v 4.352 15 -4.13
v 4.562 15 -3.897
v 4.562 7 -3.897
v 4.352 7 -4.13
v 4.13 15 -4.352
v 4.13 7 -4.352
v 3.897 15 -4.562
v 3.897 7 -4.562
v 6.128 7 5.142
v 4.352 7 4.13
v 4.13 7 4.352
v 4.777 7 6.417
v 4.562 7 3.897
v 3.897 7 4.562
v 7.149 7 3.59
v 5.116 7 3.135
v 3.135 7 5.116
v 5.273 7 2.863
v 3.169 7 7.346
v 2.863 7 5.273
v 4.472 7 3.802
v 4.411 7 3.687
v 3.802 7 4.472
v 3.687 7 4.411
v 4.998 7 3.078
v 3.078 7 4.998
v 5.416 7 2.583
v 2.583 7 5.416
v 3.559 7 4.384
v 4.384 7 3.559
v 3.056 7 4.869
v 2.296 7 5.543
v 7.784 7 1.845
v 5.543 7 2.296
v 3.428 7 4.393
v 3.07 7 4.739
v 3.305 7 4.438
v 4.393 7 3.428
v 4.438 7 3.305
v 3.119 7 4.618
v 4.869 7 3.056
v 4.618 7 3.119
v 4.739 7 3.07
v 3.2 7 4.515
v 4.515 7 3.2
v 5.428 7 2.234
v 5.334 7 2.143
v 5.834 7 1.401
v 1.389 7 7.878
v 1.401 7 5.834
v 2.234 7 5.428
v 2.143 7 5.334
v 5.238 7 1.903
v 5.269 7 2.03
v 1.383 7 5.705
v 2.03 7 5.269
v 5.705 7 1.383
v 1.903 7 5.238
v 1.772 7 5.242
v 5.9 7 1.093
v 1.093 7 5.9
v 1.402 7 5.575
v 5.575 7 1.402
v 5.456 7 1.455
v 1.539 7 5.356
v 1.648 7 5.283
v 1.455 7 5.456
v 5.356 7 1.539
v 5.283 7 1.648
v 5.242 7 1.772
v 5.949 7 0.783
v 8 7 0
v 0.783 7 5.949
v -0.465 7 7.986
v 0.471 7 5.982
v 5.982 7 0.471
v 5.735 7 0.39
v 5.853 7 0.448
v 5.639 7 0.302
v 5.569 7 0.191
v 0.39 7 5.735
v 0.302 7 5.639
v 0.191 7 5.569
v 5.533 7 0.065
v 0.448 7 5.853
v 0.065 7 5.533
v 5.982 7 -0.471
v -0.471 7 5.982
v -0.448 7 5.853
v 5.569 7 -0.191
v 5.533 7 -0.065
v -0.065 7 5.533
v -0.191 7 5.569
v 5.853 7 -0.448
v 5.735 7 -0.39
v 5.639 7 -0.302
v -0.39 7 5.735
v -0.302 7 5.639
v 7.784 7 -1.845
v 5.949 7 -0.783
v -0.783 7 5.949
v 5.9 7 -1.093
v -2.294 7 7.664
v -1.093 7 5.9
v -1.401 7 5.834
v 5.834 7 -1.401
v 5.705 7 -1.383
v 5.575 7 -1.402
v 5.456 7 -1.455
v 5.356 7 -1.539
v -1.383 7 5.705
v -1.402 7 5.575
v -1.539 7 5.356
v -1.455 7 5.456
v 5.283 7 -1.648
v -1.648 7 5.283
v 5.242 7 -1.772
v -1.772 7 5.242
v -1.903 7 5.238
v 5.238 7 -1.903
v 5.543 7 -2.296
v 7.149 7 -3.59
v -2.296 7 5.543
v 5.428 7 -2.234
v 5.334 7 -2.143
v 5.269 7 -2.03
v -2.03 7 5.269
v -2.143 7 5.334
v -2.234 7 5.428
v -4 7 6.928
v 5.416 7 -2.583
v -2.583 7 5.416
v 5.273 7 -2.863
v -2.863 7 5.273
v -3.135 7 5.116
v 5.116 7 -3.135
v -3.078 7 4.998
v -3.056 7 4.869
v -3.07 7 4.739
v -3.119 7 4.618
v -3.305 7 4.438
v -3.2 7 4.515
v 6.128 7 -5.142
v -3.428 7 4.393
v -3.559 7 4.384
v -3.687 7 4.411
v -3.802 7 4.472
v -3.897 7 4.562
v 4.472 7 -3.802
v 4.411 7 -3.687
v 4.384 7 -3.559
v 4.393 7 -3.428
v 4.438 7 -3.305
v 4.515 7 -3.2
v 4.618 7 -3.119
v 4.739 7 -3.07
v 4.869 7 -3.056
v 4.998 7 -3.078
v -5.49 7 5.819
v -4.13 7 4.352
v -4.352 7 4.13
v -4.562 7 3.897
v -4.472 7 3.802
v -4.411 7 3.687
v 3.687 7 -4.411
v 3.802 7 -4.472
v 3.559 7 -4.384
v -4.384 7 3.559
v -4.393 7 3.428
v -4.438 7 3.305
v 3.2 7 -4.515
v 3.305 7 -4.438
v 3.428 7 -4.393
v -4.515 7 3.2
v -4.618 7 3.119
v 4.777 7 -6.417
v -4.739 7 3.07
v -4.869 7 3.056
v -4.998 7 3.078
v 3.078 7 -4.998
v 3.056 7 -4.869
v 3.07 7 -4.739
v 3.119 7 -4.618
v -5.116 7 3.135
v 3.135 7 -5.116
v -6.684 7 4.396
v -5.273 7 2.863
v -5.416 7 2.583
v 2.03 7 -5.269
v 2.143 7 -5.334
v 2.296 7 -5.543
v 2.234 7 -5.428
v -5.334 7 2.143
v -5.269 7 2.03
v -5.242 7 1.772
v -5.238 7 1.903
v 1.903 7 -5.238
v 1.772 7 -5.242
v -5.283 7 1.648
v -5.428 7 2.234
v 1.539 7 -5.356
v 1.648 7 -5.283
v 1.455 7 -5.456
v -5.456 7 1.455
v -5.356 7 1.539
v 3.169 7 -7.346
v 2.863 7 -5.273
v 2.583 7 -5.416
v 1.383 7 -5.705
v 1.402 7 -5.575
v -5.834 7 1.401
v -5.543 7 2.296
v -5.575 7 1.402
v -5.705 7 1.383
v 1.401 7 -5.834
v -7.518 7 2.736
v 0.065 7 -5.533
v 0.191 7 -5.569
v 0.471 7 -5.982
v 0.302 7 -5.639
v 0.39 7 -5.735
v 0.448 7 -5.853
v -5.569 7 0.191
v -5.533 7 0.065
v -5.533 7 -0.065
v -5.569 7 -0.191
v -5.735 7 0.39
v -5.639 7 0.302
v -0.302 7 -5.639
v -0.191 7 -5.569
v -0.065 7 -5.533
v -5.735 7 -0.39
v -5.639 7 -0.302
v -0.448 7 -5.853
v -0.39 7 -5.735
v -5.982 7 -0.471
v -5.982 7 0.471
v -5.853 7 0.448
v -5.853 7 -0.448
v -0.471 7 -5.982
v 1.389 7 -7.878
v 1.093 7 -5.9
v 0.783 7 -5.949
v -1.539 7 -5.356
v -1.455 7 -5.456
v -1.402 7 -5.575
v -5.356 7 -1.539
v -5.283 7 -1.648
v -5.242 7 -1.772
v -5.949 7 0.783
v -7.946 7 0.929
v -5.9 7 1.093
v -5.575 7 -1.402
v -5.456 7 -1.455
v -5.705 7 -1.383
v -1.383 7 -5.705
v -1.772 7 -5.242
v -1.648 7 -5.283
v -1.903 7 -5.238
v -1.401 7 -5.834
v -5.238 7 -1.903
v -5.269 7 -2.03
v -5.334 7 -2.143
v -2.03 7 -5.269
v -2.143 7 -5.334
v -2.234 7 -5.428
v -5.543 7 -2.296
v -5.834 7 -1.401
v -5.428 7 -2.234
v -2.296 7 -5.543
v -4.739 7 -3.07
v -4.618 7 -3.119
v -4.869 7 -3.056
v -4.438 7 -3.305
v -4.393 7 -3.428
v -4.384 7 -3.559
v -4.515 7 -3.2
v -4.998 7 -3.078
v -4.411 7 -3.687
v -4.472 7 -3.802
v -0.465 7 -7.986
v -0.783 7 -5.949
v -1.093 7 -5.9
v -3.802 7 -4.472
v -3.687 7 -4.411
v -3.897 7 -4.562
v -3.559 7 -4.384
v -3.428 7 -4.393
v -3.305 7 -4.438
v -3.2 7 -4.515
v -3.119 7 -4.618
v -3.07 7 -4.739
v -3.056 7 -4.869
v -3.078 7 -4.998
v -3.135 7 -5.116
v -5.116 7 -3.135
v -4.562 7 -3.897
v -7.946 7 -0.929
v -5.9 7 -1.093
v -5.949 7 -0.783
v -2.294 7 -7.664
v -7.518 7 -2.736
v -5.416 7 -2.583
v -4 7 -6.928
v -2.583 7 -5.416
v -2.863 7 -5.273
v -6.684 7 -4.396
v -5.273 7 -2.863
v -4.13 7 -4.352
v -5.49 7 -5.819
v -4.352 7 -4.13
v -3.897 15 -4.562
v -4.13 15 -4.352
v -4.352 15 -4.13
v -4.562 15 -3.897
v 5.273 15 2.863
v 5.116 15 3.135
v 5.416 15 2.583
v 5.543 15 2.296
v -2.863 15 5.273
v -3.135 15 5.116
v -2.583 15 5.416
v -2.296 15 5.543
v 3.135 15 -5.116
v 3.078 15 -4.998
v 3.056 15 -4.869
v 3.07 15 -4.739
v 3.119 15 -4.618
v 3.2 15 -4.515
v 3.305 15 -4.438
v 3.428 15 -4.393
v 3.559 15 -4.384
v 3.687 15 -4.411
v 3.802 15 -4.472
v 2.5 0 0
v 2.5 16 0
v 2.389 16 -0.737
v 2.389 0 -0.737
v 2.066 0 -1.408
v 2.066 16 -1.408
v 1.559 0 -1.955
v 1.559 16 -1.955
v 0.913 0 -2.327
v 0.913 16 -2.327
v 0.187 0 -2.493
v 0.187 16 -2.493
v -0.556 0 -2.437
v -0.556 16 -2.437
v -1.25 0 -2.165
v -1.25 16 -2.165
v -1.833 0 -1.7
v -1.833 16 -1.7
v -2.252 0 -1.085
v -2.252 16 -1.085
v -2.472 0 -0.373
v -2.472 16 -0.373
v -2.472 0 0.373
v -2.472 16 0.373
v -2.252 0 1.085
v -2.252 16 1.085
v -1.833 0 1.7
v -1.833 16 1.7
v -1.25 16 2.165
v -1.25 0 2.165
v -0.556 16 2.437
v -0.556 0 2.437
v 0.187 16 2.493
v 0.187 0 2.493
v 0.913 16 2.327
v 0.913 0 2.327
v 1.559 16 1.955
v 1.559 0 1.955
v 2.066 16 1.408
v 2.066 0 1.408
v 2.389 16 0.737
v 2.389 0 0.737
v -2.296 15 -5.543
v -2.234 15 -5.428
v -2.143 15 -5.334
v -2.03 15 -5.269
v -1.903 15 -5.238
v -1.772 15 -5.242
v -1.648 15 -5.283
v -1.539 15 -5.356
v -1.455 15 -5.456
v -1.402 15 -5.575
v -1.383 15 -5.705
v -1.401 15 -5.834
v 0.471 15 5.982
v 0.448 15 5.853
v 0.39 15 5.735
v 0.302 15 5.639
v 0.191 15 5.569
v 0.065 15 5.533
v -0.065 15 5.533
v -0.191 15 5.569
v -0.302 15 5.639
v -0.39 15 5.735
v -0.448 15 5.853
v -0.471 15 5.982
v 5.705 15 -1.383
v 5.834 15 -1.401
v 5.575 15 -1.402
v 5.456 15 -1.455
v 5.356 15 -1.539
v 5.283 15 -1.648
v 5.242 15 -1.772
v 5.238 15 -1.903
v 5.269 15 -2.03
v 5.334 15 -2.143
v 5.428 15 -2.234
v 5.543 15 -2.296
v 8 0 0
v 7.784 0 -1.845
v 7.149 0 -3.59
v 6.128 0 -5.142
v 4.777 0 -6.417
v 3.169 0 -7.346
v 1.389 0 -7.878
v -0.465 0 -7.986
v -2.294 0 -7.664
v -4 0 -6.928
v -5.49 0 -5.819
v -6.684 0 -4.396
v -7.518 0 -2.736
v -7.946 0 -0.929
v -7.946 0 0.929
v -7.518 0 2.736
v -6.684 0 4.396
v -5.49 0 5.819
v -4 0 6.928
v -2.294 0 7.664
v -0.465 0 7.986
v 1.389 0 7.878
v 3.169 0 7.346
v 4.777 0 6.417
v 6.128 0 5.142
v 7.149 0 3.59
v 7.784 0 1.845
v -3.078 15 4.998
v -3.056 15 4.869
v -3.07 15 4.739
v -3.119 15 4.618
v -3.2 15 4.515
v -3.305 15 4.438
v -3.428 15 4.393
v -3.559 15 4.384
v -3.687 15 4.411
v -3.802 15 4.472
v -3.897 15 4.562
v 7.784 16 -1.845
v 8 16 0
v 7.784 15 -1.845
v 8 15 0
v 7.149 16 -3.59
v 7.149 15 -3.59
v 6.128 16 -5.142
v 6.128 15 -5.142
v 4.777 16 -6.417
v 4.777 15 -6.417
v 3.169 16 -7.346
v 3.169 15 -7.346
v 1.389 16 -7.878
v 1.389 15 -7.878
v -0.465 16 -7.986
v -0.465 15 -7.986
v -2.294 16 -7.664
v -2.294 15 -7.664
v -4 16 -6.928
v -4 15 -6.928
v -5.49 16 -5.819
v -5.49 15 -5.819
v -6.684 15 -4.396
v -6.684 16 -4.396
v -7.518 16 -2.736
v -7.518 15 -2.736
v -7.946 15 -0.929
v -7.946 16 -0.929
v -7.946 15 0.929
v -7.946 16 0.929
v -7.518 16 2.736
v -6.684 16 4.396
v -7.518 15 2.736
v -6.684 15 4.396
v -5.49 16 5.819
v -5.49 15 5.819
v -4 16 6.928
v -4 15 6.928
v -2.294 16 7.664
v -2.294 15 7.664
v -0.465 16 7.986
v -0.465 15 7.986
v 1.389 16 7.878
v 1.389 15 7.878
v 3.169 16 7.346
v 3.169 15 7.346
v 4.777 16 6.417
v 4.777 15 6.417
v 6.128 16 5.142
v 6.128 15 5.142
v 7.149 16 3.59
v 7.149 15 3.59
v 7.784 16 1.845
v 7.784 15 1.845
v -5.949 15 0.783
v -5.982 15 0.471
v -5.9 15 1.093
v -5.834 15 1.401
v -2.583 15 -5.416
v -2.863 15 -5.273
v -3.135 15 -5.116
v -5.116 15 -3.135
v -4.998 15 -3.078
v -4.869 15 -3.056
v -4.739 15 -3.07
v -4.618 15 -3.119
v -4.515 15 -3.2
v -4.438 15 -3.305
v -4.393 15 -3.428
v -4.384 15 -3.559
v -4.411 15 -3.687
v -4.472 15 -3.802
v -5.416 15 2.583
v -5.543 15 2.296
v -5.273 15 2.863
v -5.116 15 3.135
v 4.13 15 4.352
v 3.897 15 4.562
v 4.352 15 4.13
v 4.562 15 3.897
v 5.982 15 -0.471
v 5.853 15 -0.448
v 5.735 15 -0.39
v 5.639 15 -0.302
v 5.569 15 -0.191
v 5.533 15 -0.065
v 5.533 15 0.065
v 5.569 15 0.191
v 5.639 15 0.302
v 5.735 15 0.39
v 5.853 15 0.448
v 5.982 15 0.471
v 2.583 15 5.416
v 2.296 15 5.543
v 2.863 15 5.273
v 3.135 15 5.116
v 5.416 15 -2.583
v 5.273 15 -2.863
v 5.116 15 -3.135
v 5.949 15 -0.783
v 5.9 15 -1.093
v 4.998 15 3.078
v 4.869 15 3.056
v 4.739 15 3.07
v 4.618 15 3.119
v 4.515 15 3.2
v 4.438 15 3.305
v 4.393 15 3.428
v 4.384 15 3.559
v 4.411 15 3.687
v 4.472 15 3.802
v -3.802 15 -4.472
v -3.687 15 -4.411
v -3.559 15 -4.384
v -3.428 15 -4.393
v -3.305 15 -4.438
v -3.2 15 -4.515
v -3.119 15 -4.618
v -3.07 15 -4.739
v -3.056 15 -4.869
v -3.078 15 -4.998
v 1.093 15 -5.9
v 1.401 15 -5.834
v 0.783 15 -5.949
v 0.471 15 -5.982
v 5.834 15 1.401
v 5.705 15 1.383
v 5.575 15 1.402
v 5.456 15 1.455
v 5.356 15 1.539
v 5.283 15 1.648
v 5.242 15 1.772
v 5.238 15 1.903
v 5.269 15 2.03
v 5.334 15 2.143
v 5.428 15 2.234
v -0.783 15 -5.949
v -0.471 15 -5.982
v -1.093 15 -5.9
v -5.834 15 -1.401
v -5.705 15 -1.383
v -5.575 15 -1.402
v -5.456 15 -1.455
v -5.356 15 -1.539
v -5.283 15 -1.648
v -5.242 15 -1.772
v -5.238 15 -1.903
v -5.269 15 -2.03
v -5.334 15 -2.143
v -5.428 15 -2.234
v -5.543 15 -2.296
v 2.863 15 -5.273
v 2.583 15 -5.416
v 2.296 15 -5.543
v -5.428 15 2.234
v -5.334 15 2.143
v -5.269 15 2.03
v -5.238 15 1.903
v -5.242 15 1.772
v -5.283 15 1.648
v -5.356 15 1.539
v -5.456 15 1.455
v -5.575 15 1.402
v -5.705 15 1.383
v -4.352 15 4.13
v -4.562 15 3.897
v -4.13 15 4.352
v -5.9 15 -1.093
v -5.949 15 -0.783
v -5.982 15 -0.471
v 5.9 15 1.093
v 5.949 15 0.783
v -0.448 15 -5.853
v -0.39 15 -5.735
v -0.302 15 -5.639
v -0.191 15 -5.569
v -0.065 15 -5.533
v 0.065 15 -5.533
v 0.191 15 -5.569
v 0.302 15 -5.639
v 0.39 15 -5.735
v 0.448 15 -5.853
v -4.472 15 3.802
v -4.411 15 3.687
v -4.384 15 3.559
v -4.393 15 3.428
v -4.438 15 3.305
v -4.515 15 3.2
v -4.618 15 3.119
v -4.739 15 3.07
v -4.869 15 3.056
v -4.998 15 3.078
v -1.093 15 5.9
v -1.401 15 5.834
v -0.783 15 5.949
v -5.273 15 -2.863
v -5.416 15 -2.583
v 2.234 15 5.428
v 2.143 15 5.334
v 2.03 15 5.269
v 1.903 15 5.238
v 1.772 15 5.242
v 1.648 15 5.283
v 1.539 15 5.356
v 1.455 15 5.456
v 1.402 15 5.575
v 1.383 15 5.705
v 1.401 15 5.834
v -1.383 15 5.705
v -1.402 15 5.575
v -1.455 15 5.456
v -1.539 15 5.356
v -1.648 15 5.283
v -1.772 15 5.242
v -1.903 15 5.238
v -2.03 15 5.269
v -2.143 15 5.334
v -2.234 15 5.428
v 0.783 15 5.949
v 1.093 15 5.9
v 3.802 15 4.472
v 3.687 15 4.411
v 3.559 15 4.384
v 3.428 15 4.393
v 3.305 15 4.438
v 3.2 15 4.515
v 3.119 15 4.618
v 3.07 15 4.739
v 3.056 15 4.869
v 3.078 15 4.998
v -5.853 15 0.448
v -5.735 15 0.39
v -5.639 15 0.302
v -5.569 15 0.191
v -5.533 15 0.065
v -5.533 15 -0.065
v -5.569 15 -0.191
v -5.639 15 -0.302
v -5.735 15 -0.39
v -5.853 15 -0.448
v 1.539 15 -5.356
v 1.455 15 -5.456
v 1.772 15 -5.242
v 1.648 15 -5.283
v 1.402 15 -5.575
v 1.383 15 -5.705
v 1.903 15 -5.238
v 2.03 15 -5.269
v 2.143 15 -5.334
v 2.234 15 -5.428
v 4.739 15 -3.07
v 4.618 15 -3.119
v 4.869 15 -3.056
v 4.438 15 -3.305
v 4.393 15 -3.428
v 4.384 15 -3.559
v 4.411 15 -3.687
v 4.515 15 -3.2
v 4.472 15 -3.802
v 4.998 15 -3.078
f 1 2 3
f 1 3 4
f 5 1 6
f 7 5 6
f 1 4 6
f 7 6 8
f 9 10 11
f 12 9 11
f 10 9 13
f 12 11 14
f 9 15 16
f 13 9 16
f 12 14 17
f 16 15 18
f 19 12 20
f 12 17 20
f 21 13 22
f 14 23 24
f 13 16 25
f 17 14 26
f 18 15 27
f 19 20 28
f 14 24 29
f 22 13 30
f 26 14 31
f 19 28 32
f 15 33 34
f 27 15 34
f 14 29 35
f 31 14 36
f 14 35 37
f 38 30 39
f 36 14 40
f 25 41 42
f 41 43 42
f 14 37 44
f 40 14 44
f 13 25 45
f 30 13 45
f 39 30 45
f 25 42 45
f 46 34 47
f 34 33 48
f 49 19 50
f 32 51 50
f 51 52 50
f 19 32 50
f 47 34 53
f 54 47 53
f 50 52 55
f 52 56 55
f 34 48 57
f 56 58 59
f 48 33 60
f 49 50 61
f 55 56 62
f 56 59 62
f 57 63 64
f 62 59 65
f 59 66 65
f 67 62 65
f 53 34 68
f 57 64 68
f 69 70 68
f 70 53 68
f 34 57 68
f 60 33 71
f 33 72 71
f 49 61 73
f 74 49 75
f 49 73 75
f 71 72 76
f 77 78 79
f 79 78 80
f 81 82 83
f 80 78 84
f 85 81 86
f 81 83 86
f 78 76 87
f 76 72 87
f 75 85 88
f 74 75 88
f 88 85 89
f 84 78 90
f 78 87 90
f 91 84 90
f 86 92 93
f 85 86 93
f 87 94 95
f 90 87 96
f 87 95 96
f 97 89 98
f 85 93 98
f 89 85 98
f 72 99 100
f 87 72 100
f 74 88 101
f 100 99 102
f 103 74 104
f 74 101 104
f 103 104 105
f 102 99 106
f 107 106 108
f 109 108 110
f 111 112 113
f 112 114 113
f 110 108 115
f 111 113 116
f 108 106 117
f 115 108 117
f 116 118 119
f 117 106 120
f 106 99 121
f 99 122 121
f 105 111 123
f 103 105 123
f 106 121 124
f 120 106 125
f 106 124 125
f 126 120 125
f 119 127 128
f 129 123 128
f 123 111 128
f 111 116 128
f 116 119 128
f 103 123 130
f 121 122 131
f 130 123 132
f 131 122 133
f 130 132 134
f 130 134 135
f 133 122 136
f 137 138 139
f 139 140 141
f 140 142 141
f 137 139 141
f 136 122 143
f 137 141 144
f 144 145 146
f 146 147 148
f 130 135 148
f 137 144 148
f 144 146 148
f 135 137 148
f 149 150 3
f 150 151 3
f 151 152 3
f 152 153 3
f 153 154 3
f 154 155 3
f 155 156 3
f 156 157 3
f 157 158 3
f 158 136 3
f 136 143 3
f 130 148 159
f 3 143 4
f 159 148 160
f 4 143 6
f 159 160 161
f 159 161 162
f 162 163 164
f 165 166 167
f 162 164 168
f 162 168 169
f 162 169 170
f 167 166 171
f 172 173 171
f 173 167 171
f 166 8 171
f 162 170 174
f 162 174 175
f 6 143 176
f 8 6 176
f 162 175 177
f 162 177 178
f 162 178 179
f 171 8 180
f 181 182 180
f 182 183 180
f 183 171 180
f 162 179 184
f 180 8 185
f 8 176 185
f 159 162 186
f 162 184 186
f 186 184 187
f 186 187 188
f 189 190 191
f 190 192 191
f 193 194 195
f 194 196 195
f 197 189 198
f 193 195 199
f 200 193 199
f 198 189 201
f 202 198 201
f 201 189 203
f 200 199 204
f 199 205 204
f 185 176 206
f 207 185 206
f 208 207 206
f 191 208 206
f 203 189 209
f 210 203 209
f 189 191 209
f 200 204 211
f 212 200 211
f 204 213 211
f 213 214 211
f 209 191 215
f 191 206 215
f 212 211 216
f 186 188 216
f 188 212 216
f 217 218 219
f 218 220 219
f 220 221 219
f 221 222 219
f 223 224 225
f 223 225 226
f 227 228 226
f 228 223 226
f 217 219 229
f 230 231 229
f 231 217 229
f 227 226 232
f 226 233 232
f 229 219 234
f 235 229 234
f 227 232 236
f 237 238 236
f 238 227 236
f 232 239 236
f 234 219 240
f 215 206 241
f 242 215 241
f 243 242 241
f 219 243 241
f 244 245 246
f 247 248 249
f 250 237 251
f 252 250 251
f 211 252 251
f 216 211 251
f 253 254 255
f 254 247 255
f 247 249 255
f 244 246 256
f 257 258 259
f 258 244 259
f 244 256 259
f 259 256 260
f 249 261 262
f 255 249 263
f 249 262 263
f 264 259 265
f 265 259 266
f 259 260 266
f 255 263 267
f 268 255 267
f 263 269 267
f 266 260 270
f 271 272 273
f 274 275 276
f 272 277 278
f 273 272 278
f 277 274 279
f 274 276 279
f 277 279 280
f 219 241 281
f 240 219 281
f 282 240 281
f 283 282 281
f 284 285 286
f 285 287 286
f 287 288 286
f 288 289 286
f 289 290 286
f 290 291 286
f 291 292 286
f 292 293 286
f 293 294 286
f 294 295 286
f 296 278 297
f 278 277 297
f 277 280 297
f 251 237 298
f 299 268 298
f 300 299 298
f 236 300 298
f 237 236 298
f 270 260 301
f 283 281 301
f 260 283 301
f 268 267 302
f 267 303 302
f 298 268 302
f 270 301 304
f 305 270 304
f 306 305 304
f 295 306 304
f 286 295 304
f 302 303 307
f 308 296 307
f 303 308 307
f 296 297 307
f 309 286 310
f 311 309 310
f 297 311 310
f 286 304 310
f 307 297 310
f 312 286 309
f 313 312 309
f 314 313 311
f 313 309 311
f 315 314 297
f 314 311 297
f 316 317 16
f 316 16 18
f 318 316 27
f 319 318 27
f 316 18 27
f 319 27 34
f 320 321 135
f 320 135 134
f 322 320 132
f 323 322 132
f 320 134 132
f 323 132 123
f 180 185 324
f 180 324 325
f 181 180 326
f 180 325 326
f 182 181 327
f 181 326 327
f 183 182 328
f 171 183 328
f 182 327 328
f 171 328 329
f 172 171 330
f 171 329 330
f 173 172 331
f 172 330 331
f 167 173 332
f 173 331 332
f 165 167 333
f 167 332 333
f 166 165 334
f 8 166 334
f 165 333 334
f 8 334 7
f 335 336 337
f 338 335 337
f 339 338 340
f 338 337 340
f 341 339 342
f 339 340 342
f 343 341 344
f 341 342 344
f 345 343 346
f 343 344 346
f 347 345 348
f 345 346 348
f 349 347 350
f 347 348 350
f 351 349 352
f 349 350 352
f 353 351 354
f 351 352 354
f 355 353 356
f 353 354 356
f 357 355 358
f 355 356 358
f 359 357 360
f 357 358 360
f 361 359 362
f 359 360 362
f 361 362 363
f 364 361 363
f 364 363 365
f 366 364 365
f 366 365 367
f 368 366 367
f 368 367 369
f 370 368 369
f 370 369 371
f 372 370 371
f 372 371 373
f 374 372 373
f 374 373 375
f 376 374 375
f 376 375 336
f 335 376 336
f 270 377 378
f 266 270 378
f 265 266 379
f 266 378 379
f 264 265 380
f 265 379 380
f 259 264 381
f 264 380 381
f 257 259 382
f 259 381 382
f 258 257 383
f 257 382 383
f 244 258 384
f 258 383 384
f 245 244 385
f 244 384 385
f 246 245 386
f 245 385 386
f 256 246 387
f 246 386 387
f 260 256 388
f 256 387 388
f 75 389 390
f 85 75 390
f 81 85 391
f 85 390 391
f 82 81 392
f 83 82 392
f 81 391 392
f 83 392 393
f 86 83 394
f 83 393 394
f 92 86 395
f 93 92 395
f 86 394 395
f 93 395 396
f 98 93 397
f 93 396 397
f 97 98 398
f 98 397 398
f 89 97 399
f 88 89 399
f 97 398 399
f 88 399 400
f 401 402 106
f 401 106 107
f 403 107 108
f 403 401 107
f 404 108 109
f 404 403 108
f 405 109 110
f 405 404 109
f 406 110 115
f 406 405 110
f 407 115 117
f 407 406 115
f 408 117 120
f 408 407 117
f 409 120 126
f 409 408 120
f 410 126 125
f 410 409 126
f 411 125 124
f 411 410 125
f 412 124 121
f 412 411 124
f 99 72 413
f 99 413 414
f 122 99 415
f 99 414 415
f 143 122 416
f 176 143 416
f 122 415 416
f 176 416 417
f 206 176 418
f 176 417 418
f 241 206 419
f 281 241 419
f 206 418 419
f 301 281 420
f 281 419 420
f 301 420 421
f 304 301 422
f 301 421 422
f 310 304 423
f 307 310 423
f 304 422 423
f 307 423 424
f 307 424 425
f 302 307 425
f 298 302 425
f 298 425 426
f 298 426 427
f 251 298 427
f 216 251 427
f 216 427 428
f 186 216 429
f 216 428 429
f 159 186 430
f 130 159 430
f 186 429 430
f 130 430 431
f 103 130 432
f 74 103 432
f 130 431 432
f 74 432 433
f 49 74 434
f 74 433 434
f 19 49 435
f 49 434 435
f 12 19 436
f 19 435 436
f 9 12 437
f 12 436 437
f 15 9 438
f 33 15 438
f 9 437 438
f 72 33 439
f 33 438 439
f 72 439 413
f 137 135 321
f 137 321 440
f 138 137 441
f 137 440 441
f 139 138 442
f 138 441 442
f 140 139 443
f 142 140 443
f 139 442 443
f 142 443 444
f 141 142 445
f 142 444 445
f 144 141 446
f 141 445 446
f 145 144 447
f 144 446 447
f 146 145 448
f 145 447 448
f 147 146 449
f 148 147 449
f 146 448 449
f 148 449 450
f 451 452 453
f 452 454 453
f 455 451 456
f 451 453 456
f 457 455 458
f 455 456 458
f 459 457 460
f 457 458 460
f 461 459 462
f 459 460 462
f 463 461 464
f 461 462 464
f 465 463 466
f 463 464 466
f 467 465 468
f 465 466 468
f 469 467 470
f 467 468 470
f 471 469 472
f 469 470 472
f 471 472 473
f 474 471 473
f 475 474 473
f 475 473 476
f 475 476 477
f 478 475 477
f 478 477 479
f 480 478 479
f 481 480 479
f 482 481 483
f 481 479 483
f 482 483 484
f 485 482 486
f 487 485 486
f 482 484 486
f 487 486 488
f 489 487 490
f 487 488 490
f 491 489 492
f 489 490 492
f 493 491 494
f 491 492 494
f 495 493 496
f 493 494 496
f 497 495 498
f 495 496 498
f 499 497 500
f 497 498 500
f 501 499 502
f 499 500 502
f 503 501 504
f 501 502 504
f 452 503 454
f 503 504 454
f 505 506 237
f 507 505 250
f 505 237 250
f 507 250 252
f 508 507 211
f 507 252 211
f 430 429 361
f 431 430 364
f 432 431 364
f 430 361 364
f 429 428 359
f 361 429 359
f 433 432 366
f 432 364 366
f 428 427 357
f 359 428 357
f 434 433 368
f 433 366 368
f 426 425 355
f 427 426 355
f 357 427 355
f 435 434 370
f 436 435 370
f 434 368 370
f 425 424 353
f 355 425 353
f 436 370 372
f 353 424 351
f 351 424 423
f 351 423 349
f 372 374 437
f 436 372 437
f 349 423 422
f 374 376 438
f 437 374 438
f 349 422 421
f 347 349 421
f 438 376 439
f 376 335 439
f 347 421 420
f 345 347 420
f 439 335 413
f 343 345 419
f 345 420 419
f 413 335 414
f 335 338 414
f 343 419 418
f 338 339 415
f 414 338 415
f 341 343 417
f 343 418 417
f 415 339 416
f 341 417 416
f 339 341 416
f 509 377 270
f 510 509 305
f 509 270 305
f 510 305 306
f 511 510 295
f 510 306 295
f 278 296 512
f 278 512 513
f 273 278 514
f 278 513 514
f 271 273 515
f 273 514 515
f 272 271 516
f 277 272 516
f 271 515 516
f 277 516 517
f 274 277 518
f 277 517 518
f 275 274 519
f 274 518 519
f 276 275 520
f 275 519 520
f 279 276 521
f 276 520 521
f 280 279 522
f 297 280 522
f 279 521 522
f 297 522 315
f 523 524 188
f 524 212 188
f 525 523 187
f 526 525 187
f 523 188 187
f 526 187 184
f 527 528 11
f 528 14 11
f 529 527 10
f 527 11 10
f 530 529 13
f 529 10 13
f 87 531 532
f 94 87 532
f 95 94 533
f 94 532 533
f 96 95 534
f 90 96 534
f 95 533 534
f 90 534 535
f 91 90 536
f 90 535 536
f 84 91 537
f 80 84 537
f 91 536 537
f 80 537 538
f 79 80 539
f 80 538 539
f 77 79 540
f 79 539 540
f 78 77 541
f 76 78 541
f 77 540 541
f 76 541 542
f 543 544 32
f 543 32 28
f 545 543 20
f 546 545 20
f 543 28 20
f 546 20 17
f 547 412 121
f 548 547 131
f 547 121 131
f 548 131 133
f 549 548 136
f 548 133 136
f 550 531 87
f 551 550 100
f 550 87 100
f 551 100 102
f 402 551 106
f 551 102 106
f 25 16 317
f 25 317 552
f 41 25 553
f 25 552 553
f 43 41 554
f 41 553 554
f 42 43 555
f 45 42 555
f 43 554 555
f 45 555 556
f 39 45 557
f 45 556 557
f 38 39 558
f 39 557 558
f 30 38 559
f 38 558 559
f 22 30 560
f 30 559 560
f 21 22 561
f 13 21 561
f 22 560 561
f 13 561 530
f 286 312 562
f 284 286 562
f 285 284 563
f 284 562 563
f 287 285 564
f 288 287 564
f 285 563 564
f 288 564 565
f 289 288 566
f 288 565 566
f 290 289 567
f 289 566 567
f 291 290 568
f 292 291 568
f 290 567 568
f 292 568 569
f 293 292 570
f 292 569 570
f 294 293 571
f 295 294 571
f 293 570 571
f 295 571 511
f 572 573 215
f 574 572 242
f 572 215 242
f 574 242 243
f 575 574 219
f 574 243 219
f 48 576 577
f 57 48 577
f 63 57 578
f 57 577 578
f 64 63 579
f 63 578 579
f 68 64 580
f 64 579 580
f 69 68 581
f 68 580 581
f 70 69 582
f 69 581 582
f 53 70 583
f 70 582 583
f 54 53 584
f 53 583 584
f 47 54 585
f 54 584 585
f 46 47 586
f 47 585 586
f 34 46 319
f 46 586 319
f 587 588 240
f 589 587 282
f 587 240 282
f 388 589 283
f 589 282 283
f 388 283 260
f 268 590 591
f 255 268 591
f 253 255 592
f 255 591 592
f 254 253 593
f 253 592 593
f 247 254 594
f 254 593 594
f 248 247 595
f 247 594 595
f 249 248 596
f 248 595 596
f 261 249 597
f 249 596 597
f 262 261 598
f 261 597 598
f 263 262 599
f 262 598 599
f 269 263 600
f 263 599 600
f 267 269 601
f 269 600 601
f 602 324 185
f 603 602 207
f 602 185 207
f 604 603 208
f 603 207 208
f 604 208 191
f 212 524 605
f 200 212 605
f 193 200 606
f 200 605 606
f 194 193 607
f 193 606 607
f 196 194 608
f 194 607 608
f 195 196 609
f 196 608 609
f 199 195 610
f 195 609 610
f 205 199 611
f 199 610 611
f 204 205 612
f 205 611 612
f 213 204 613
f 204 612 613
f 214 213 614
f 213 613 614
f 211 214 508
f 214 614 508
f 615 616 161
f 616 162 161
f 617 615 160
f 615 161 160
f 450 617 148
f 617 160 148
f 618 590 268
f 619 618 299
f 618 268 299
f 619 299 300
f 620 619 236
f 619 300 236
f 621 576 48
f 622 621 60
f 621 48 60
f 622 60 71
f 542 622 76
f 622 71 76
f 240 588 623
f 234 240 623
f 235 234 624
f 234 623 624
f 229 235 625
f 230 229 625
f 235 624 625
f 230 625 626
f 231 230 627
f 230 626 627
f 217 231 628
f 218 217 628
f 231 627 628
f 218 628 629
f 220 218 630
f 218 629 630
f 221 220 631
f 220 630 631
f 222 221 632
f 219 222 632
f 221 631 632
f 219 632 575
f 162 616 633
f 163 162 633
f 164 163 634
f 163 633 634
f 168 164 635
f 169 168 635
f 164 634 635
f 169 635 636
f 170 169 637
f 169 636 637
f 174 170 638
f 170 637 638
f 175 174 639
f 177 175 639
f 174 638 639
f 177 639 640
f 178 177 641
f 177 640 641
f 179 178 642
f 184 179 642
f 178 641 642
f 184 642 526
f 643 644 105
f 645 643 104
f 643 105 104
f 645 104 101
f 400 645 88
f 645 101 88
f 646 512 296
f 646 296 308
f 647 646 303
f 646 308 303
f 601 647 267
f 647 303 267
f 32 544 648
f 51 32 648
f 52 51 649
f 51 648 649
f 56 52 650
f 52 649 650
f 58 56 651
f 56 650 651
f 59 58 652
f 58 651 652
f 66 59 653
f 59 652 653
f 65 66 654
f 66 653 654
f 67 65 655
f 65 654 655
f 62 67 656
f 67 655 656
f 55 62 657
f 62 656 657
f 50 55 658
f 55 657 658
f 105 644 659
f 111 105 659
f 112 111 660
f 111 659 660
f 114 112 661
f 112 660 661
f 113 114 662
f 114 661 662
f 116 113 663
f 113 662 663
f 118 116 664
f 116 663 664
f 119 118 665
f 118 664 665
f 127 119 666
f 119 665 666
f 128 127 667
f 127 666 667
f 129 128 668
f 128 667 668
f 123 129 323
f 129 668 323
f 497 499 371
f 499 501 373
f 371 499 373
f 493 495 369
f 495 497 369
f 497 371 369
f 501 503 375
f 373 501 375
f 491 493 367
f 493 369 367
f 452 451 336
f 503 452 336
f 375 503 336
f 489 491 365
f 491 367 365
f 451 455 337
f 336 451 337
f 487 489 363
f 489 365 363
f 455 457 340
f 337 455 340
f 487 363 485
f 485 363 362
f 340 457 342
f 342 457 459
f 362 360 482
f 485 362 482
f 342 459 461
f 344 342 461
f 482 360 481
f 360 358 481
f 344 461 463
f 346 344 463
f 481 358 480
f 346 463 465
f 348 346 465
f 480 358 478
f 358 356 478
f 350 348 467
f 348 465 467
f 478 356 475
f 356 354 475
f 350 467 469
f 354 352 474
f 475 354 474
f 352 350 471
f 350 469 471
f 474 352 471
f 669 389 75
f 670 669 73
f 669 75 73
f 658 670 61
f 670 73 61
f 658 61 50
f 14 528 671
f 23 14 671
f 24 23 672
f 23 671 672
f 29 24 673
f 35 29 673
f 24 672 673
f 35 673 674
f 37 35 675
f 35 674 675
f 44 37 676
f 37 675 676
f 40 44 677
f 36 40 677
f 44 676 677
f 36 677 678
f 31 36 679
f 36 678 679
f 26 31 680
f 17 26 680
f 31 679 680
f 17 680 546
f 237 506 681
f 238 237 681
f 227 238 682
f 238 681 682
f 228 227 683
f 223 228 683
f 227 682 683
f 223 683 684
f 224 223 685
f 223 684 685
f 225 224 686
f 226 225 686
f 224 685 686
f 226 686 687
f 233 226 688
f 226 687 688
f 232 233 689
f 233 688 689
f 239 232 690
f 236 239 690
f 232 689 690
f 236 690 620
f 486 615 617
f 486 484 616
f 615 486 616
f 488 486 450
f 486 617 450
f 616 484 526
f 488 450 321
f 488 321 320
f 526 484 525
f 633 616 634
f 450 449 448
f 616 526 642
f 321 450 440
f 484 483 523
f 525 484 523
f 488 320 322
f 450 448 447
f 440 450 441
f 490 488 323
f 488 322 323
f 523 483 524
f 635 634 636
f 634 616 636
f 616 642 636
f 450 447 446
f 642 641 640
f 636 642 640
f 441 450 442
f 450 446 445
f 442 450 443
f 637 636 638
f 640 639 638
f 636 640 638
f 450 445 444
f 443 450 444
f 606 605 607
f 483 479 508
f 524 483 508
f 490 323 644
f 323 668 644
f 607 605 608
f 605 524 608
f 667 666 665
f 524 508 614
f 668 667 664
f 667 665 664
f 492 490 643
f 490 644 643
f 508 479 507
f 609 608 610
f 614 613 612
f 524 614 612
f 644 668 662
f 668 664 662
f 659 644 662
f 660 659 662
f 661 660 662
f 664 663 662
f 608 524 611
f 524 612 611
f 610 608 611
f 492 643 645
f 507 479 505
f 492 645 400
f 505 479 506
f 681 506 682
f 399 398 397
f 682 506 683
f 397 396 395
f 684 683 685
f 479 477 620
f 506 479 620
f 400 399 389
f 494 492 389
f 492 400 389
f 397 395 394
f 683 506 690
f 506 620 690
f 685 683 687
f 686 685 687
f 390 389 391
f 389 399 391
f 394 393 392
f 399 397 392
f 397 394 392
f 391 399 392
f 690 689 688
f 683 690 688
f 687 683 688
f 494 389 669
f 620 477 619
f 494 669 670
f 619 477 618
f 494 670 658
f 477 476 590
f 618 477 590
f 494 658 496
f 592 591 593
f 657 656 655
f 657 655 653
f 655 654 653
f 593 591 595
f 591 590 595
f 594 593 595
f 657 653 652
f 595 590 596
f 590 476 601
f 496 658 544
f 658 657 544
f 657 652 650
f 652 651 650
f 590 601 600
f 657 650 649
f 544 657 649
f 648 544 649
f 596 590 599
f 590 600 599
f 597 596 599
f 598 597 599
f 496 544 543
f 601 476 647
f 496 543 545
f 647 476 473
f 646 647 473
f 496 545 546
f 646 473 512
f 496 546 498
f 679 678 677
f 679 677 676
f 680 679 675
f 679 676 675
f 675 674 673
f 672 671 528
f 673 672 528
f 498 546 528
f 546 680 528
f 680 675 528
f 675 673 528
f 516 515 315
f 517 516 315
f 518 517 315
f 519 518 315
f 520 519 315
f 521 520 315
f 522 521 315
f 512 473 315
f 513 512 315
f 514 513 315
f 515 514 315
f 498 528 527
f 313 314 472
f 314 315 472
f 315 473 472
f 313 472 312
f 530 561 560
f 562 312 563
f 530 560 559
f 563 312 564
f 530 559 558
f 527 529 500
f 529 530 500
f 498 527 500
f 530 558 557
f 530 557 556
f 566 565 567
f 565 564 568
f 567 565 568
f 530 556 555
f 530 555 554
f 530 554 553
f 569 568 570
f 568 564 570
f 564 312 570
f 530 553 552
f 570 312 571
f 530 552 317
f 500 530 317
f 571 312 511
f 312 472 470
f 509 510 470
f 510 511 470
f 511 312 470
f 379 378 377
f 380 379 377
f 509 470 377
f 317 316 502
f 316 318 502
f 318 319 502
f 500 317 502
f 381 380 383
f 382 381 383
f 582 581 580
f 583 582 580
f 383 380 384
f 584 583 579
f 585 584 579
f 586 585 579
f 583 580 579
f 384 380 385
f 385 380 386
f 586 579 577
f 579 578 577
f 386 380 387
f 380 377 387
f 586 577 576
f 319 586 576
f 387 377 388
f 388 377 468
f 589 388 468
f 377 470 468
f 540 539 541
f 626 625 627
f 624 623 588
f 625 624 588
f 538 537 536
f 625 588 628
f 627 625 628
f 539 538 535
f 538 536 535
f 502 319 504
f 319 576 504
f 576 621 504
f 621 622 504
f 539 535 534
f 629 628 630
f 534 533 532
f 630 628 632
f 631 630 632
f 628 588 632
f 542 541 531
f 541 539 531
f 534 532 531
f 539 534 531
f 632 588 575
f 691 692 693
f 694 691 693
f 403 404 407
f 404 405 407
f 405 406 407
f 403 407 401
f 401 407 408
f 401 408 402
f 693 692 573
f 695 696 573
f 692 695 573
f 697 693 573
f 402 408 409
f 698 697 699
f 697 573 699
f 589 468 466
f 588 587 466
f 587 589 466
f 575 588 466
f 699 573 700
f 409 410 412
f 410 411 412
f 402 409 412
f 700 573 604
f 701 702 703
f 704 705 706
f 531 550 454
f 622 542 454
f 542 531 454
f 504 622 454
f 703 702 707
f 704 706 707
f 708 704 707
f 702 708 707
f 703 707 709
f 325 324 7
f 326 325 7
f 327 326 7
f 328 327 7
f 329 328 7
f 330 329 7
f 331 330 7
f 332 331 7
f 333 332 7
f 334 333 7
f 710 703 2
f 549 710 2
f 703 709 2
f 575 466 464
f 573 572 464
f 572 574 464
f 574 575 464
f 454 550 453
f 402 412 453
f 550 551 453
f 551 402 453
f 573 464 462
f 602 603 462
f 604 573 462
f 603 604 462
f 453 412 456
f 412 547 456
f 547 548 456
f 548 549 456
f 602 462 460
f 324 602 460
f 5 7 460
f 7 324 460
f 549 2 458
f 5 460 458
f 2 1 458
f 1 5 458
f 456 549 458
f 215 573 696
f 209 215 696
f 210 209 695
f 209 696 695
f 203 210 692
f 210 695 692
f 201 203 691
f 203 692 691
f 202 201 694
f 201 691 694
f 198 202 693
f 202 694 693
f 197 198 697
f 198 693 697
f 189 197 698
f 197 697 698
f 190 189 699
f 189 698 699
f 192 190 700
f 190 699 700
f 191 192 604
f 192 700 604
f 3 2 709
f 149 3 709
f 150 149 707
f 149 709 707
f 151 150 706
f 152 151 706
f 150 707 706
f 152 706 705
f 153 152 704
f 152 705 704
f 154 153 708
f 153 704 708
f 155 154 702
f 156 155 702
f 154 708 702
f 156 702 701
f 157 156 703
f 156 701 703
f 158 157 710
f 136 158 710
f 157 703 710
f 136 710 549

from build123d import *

# Parameters (mm, degrees)
ESQUISSE2_R             = 2.5
ENL_V_MAT_EXTRU_1_DEPTH = 17
ENL_V_MAT_EXTRU_2_DEPTH = 8


with BuildPart() as part:
    # Esquisse1 → Révolution1 (revolve)
    with BuildSketch(Plane.XY):
        Polygon((0, 0), (0, 16), (8, 16), (8, 15), (6, 15), (6, 7), (8, 7), (8, 0), align=None)
    revolve(axis=Axis((0, 0, 0), (0, 1, 0)))

    # Esquisse2 → Enlèv. mat.-Extru.1 (cut, through all)
    with BuildSketch(Plane(origin=(0, 16, 0), x_dir=(1, 0, 0), z_dir=(0, 1, 0))):
        Circle(ESQUISSE2_R)
    extrude(amount=-ENL_V_MAT_EXTRU_1_DEPTH, mode=Mode.SUBTRACT)

    # Esquisse3 → Enlèv. mat.-Extru.2 (cut)
    with BuildSketch(Plane.XZ.offset(-15)):
        with BuildLine():
            ThreePointArc((5.981504002, -0.470754574), (5.528882211, 0), (5.981504002, 0.470754574))
            ThreePointArc((5.981504002, 0.470754574), (6, 0), (5.981504002, -0.470754574))
        make_face()
        with BuildLine():
            ThreePointArc((5.543277195, -2.296100594), (5.706339098, -1.854101966), (5.834219522, -1.400672183))
            ThreePointArc((5.834219522, -1.400672183), (5.258279454, -1.708518563), (5.543277195, -2.296100594))
        make_face()
        with BuildLine():
            ThreePointArc((4.562435794, -3.89668829), (4.472959669, -3.249795425), (5.115840986, -3.134991388))
            ThreePointArc((5.115840986, -3.134991388), (4.854101966, -3.526711514), (4.562435794, -3.89668829))
        make_face()
        with BuildLine():
            ThreePointArc((3.134991388, -5.115840986), (3.249795425, -4.472959669), (3.89668829, -4.562435794))
            ThreePointArc((3.89668829, -4.562435794), (3.526711514, -4.854101966), (3.134991388, -5.115840986))
        make_face()
        with BuildLine():
            ThreePointArc((1.400672183, -5.834219522), (1.708518563, -5.258279454), (2.296100594, -5.543277195))
            ThreePointArc((2.296100594, -5.543277195), (1.854101966, -5.706339098), (1.400672183, -5.834219522))
        make_face()
        with BuildLine():
            ThreePointArc((-0.470754574, -5.981504002), (0, -5.528882211), (0.470754574, -5.981504002))
            ThreePointArc((0.470754574, -5.981504002), (0, -6), (-0.470754574, -5.981504002))
        make_face()
        with BuildLine():
            ThreePointArc((-2.296100594, -5.543277195), (-1.708518563, -5.258279454), (-1.400672183, -5.834219522))
            ThreePointArc((-1.400672183, -5.834219522), (-1.854101966, -5.706339098), (-2.296100594, -5.543277195))
        make_face()
        with BuildLine():
            ThreePointArc((-3.89668829, -4.562435794), (-3.249795425, -4.472959669), (-3.134991388, -5.115840986))
            ThreePointArc((-3.134991388, -5.115840986), (-3.526711514, -4.854101966), (-3.89668829, -4.562435794))
        make_face()
        with BuildLine():
            ThreePointArc((-5.115840986, -3.134991388), (-4.472959669, -3.249795425), (-4.562435794, -3.89668829))
            ThreePointArc((-4.562435794, -3.89668829), (-4.854101966, -3.526711514), (-5.115840986, -3.134991388))
        make_face()
        with BuildLine():
            ThreePointArc((-5.834219522, -1.400672183), (-5.258279454, -1.708518563), (-5.543277195, -2.296100594))
            ThreePointArc((-5.543277195, -2.296100594), (-5.706339098, -1.854101966), (-5.834219522, -1.400672183))
        make_face()
        with BuildLine():
            ThreePointArc((-5.981504002, 0.470754574), (-5.528882211, 0), (-5.981504002, -0.470754574))
            ThreePointArc((-5.981504002, -0.470754574), (-6, 0), (-5.981504002, 0.470754574))
        make_face()
        with BuildLine():
            ThreePointArc((-5.543277195, 2.296100594), (-5.258279454, 1.708518563), (-5.834219522, 1.400672183))
            ThreePointArc((-5.834219522, 1.400672183), (-5.706339098, 1.854101966), (-5.543277195, 2.296100594))
        make_face()
        with BuildLine():
            ThreePointArc((-4.562435794, 3.89668829), (-4.472959669, 3.249795425), (-5.115840986, 3.134991388))
            ThreePointArc((-5.115840986, 3.134991388), (-4.854101966, 3.526711514), (-4.562435794, 3.89668829))
        make_face()
        with BuildLine():
            ThreePointArc((-3.134991388, 5.115840986), (-3.249795425, 4.472959669), (-3.89668829, 4.562435794))
            ThreePointArc((-3.89668829, 4.562435794), (-3.526711514, 4.854101966), (-3.134991388, 5.115840986))
        make_face()
        with BuildLine():
            ThreePointArc((-1.400672183, 5.834219522), (-1.708518563, 5.258279454), (-2.296100594, 5.543277195))
            ThreePointArc((-2.296100594, 5.543277195), (-1.854101966, 5.706339098), (-1.400672183, 5.834219522))
        make_face()
        with BuildLine():
            ThreePointArc((0.470754574, 5.981504002), (0, 5.528882211), (-0.470754574, 5.981504002))
            ThreePointArc((-0.470754574, 5.981504002), (0, 6), (0.470754574, 5.981504002))
        make_face()
        with BuildLine():
            ThreePointArc((2.296100594, 5.543277195), (1.708518563, 5.258279454), (1.400672183, 5.834219522))
            ThreePointArc((1.400672183, 5.834219522), (1.854101966, 5.706339098), (2.296100594, 5.543277195))
        make_face()
        with BuildLine():
            ThreePointArc((3.89668829, 4.562435794), (3.249795425, 4.472959669), (3.134991388, 5.115840986))
            ThreePointArc((3.134991388, 5.115840986), (3.526711514, 4.854101966), (3.89668829, 4.562435794))
        make_face()
        with BuildLine():
            ThreePointArc((5.115840986, 3.134991388), (4.472959669, 3.249795425), (4.562435794, 3.89668829))
            ThreePointArc((4.562435794, 3.89668829), (4.854101966, 3.526711514), (5.115840986, 3.134991388))
        make_face()
        with BuildLine():
            ThreePointArc((5.834219522, 1.400672183), (5.258279454, 1.708518563), (5.543277195, 2.296100594))
            ThreePointArc((5.543277195, 2.296100594), (5.706339098, 1.854101966), (5.834219522, 1.400672183))
        make_face()
    extrude(amount=ENL_V_MAT_EXTRU_2_DEPTH, mode=Mode.SUBTRACT)


solid = part.part
